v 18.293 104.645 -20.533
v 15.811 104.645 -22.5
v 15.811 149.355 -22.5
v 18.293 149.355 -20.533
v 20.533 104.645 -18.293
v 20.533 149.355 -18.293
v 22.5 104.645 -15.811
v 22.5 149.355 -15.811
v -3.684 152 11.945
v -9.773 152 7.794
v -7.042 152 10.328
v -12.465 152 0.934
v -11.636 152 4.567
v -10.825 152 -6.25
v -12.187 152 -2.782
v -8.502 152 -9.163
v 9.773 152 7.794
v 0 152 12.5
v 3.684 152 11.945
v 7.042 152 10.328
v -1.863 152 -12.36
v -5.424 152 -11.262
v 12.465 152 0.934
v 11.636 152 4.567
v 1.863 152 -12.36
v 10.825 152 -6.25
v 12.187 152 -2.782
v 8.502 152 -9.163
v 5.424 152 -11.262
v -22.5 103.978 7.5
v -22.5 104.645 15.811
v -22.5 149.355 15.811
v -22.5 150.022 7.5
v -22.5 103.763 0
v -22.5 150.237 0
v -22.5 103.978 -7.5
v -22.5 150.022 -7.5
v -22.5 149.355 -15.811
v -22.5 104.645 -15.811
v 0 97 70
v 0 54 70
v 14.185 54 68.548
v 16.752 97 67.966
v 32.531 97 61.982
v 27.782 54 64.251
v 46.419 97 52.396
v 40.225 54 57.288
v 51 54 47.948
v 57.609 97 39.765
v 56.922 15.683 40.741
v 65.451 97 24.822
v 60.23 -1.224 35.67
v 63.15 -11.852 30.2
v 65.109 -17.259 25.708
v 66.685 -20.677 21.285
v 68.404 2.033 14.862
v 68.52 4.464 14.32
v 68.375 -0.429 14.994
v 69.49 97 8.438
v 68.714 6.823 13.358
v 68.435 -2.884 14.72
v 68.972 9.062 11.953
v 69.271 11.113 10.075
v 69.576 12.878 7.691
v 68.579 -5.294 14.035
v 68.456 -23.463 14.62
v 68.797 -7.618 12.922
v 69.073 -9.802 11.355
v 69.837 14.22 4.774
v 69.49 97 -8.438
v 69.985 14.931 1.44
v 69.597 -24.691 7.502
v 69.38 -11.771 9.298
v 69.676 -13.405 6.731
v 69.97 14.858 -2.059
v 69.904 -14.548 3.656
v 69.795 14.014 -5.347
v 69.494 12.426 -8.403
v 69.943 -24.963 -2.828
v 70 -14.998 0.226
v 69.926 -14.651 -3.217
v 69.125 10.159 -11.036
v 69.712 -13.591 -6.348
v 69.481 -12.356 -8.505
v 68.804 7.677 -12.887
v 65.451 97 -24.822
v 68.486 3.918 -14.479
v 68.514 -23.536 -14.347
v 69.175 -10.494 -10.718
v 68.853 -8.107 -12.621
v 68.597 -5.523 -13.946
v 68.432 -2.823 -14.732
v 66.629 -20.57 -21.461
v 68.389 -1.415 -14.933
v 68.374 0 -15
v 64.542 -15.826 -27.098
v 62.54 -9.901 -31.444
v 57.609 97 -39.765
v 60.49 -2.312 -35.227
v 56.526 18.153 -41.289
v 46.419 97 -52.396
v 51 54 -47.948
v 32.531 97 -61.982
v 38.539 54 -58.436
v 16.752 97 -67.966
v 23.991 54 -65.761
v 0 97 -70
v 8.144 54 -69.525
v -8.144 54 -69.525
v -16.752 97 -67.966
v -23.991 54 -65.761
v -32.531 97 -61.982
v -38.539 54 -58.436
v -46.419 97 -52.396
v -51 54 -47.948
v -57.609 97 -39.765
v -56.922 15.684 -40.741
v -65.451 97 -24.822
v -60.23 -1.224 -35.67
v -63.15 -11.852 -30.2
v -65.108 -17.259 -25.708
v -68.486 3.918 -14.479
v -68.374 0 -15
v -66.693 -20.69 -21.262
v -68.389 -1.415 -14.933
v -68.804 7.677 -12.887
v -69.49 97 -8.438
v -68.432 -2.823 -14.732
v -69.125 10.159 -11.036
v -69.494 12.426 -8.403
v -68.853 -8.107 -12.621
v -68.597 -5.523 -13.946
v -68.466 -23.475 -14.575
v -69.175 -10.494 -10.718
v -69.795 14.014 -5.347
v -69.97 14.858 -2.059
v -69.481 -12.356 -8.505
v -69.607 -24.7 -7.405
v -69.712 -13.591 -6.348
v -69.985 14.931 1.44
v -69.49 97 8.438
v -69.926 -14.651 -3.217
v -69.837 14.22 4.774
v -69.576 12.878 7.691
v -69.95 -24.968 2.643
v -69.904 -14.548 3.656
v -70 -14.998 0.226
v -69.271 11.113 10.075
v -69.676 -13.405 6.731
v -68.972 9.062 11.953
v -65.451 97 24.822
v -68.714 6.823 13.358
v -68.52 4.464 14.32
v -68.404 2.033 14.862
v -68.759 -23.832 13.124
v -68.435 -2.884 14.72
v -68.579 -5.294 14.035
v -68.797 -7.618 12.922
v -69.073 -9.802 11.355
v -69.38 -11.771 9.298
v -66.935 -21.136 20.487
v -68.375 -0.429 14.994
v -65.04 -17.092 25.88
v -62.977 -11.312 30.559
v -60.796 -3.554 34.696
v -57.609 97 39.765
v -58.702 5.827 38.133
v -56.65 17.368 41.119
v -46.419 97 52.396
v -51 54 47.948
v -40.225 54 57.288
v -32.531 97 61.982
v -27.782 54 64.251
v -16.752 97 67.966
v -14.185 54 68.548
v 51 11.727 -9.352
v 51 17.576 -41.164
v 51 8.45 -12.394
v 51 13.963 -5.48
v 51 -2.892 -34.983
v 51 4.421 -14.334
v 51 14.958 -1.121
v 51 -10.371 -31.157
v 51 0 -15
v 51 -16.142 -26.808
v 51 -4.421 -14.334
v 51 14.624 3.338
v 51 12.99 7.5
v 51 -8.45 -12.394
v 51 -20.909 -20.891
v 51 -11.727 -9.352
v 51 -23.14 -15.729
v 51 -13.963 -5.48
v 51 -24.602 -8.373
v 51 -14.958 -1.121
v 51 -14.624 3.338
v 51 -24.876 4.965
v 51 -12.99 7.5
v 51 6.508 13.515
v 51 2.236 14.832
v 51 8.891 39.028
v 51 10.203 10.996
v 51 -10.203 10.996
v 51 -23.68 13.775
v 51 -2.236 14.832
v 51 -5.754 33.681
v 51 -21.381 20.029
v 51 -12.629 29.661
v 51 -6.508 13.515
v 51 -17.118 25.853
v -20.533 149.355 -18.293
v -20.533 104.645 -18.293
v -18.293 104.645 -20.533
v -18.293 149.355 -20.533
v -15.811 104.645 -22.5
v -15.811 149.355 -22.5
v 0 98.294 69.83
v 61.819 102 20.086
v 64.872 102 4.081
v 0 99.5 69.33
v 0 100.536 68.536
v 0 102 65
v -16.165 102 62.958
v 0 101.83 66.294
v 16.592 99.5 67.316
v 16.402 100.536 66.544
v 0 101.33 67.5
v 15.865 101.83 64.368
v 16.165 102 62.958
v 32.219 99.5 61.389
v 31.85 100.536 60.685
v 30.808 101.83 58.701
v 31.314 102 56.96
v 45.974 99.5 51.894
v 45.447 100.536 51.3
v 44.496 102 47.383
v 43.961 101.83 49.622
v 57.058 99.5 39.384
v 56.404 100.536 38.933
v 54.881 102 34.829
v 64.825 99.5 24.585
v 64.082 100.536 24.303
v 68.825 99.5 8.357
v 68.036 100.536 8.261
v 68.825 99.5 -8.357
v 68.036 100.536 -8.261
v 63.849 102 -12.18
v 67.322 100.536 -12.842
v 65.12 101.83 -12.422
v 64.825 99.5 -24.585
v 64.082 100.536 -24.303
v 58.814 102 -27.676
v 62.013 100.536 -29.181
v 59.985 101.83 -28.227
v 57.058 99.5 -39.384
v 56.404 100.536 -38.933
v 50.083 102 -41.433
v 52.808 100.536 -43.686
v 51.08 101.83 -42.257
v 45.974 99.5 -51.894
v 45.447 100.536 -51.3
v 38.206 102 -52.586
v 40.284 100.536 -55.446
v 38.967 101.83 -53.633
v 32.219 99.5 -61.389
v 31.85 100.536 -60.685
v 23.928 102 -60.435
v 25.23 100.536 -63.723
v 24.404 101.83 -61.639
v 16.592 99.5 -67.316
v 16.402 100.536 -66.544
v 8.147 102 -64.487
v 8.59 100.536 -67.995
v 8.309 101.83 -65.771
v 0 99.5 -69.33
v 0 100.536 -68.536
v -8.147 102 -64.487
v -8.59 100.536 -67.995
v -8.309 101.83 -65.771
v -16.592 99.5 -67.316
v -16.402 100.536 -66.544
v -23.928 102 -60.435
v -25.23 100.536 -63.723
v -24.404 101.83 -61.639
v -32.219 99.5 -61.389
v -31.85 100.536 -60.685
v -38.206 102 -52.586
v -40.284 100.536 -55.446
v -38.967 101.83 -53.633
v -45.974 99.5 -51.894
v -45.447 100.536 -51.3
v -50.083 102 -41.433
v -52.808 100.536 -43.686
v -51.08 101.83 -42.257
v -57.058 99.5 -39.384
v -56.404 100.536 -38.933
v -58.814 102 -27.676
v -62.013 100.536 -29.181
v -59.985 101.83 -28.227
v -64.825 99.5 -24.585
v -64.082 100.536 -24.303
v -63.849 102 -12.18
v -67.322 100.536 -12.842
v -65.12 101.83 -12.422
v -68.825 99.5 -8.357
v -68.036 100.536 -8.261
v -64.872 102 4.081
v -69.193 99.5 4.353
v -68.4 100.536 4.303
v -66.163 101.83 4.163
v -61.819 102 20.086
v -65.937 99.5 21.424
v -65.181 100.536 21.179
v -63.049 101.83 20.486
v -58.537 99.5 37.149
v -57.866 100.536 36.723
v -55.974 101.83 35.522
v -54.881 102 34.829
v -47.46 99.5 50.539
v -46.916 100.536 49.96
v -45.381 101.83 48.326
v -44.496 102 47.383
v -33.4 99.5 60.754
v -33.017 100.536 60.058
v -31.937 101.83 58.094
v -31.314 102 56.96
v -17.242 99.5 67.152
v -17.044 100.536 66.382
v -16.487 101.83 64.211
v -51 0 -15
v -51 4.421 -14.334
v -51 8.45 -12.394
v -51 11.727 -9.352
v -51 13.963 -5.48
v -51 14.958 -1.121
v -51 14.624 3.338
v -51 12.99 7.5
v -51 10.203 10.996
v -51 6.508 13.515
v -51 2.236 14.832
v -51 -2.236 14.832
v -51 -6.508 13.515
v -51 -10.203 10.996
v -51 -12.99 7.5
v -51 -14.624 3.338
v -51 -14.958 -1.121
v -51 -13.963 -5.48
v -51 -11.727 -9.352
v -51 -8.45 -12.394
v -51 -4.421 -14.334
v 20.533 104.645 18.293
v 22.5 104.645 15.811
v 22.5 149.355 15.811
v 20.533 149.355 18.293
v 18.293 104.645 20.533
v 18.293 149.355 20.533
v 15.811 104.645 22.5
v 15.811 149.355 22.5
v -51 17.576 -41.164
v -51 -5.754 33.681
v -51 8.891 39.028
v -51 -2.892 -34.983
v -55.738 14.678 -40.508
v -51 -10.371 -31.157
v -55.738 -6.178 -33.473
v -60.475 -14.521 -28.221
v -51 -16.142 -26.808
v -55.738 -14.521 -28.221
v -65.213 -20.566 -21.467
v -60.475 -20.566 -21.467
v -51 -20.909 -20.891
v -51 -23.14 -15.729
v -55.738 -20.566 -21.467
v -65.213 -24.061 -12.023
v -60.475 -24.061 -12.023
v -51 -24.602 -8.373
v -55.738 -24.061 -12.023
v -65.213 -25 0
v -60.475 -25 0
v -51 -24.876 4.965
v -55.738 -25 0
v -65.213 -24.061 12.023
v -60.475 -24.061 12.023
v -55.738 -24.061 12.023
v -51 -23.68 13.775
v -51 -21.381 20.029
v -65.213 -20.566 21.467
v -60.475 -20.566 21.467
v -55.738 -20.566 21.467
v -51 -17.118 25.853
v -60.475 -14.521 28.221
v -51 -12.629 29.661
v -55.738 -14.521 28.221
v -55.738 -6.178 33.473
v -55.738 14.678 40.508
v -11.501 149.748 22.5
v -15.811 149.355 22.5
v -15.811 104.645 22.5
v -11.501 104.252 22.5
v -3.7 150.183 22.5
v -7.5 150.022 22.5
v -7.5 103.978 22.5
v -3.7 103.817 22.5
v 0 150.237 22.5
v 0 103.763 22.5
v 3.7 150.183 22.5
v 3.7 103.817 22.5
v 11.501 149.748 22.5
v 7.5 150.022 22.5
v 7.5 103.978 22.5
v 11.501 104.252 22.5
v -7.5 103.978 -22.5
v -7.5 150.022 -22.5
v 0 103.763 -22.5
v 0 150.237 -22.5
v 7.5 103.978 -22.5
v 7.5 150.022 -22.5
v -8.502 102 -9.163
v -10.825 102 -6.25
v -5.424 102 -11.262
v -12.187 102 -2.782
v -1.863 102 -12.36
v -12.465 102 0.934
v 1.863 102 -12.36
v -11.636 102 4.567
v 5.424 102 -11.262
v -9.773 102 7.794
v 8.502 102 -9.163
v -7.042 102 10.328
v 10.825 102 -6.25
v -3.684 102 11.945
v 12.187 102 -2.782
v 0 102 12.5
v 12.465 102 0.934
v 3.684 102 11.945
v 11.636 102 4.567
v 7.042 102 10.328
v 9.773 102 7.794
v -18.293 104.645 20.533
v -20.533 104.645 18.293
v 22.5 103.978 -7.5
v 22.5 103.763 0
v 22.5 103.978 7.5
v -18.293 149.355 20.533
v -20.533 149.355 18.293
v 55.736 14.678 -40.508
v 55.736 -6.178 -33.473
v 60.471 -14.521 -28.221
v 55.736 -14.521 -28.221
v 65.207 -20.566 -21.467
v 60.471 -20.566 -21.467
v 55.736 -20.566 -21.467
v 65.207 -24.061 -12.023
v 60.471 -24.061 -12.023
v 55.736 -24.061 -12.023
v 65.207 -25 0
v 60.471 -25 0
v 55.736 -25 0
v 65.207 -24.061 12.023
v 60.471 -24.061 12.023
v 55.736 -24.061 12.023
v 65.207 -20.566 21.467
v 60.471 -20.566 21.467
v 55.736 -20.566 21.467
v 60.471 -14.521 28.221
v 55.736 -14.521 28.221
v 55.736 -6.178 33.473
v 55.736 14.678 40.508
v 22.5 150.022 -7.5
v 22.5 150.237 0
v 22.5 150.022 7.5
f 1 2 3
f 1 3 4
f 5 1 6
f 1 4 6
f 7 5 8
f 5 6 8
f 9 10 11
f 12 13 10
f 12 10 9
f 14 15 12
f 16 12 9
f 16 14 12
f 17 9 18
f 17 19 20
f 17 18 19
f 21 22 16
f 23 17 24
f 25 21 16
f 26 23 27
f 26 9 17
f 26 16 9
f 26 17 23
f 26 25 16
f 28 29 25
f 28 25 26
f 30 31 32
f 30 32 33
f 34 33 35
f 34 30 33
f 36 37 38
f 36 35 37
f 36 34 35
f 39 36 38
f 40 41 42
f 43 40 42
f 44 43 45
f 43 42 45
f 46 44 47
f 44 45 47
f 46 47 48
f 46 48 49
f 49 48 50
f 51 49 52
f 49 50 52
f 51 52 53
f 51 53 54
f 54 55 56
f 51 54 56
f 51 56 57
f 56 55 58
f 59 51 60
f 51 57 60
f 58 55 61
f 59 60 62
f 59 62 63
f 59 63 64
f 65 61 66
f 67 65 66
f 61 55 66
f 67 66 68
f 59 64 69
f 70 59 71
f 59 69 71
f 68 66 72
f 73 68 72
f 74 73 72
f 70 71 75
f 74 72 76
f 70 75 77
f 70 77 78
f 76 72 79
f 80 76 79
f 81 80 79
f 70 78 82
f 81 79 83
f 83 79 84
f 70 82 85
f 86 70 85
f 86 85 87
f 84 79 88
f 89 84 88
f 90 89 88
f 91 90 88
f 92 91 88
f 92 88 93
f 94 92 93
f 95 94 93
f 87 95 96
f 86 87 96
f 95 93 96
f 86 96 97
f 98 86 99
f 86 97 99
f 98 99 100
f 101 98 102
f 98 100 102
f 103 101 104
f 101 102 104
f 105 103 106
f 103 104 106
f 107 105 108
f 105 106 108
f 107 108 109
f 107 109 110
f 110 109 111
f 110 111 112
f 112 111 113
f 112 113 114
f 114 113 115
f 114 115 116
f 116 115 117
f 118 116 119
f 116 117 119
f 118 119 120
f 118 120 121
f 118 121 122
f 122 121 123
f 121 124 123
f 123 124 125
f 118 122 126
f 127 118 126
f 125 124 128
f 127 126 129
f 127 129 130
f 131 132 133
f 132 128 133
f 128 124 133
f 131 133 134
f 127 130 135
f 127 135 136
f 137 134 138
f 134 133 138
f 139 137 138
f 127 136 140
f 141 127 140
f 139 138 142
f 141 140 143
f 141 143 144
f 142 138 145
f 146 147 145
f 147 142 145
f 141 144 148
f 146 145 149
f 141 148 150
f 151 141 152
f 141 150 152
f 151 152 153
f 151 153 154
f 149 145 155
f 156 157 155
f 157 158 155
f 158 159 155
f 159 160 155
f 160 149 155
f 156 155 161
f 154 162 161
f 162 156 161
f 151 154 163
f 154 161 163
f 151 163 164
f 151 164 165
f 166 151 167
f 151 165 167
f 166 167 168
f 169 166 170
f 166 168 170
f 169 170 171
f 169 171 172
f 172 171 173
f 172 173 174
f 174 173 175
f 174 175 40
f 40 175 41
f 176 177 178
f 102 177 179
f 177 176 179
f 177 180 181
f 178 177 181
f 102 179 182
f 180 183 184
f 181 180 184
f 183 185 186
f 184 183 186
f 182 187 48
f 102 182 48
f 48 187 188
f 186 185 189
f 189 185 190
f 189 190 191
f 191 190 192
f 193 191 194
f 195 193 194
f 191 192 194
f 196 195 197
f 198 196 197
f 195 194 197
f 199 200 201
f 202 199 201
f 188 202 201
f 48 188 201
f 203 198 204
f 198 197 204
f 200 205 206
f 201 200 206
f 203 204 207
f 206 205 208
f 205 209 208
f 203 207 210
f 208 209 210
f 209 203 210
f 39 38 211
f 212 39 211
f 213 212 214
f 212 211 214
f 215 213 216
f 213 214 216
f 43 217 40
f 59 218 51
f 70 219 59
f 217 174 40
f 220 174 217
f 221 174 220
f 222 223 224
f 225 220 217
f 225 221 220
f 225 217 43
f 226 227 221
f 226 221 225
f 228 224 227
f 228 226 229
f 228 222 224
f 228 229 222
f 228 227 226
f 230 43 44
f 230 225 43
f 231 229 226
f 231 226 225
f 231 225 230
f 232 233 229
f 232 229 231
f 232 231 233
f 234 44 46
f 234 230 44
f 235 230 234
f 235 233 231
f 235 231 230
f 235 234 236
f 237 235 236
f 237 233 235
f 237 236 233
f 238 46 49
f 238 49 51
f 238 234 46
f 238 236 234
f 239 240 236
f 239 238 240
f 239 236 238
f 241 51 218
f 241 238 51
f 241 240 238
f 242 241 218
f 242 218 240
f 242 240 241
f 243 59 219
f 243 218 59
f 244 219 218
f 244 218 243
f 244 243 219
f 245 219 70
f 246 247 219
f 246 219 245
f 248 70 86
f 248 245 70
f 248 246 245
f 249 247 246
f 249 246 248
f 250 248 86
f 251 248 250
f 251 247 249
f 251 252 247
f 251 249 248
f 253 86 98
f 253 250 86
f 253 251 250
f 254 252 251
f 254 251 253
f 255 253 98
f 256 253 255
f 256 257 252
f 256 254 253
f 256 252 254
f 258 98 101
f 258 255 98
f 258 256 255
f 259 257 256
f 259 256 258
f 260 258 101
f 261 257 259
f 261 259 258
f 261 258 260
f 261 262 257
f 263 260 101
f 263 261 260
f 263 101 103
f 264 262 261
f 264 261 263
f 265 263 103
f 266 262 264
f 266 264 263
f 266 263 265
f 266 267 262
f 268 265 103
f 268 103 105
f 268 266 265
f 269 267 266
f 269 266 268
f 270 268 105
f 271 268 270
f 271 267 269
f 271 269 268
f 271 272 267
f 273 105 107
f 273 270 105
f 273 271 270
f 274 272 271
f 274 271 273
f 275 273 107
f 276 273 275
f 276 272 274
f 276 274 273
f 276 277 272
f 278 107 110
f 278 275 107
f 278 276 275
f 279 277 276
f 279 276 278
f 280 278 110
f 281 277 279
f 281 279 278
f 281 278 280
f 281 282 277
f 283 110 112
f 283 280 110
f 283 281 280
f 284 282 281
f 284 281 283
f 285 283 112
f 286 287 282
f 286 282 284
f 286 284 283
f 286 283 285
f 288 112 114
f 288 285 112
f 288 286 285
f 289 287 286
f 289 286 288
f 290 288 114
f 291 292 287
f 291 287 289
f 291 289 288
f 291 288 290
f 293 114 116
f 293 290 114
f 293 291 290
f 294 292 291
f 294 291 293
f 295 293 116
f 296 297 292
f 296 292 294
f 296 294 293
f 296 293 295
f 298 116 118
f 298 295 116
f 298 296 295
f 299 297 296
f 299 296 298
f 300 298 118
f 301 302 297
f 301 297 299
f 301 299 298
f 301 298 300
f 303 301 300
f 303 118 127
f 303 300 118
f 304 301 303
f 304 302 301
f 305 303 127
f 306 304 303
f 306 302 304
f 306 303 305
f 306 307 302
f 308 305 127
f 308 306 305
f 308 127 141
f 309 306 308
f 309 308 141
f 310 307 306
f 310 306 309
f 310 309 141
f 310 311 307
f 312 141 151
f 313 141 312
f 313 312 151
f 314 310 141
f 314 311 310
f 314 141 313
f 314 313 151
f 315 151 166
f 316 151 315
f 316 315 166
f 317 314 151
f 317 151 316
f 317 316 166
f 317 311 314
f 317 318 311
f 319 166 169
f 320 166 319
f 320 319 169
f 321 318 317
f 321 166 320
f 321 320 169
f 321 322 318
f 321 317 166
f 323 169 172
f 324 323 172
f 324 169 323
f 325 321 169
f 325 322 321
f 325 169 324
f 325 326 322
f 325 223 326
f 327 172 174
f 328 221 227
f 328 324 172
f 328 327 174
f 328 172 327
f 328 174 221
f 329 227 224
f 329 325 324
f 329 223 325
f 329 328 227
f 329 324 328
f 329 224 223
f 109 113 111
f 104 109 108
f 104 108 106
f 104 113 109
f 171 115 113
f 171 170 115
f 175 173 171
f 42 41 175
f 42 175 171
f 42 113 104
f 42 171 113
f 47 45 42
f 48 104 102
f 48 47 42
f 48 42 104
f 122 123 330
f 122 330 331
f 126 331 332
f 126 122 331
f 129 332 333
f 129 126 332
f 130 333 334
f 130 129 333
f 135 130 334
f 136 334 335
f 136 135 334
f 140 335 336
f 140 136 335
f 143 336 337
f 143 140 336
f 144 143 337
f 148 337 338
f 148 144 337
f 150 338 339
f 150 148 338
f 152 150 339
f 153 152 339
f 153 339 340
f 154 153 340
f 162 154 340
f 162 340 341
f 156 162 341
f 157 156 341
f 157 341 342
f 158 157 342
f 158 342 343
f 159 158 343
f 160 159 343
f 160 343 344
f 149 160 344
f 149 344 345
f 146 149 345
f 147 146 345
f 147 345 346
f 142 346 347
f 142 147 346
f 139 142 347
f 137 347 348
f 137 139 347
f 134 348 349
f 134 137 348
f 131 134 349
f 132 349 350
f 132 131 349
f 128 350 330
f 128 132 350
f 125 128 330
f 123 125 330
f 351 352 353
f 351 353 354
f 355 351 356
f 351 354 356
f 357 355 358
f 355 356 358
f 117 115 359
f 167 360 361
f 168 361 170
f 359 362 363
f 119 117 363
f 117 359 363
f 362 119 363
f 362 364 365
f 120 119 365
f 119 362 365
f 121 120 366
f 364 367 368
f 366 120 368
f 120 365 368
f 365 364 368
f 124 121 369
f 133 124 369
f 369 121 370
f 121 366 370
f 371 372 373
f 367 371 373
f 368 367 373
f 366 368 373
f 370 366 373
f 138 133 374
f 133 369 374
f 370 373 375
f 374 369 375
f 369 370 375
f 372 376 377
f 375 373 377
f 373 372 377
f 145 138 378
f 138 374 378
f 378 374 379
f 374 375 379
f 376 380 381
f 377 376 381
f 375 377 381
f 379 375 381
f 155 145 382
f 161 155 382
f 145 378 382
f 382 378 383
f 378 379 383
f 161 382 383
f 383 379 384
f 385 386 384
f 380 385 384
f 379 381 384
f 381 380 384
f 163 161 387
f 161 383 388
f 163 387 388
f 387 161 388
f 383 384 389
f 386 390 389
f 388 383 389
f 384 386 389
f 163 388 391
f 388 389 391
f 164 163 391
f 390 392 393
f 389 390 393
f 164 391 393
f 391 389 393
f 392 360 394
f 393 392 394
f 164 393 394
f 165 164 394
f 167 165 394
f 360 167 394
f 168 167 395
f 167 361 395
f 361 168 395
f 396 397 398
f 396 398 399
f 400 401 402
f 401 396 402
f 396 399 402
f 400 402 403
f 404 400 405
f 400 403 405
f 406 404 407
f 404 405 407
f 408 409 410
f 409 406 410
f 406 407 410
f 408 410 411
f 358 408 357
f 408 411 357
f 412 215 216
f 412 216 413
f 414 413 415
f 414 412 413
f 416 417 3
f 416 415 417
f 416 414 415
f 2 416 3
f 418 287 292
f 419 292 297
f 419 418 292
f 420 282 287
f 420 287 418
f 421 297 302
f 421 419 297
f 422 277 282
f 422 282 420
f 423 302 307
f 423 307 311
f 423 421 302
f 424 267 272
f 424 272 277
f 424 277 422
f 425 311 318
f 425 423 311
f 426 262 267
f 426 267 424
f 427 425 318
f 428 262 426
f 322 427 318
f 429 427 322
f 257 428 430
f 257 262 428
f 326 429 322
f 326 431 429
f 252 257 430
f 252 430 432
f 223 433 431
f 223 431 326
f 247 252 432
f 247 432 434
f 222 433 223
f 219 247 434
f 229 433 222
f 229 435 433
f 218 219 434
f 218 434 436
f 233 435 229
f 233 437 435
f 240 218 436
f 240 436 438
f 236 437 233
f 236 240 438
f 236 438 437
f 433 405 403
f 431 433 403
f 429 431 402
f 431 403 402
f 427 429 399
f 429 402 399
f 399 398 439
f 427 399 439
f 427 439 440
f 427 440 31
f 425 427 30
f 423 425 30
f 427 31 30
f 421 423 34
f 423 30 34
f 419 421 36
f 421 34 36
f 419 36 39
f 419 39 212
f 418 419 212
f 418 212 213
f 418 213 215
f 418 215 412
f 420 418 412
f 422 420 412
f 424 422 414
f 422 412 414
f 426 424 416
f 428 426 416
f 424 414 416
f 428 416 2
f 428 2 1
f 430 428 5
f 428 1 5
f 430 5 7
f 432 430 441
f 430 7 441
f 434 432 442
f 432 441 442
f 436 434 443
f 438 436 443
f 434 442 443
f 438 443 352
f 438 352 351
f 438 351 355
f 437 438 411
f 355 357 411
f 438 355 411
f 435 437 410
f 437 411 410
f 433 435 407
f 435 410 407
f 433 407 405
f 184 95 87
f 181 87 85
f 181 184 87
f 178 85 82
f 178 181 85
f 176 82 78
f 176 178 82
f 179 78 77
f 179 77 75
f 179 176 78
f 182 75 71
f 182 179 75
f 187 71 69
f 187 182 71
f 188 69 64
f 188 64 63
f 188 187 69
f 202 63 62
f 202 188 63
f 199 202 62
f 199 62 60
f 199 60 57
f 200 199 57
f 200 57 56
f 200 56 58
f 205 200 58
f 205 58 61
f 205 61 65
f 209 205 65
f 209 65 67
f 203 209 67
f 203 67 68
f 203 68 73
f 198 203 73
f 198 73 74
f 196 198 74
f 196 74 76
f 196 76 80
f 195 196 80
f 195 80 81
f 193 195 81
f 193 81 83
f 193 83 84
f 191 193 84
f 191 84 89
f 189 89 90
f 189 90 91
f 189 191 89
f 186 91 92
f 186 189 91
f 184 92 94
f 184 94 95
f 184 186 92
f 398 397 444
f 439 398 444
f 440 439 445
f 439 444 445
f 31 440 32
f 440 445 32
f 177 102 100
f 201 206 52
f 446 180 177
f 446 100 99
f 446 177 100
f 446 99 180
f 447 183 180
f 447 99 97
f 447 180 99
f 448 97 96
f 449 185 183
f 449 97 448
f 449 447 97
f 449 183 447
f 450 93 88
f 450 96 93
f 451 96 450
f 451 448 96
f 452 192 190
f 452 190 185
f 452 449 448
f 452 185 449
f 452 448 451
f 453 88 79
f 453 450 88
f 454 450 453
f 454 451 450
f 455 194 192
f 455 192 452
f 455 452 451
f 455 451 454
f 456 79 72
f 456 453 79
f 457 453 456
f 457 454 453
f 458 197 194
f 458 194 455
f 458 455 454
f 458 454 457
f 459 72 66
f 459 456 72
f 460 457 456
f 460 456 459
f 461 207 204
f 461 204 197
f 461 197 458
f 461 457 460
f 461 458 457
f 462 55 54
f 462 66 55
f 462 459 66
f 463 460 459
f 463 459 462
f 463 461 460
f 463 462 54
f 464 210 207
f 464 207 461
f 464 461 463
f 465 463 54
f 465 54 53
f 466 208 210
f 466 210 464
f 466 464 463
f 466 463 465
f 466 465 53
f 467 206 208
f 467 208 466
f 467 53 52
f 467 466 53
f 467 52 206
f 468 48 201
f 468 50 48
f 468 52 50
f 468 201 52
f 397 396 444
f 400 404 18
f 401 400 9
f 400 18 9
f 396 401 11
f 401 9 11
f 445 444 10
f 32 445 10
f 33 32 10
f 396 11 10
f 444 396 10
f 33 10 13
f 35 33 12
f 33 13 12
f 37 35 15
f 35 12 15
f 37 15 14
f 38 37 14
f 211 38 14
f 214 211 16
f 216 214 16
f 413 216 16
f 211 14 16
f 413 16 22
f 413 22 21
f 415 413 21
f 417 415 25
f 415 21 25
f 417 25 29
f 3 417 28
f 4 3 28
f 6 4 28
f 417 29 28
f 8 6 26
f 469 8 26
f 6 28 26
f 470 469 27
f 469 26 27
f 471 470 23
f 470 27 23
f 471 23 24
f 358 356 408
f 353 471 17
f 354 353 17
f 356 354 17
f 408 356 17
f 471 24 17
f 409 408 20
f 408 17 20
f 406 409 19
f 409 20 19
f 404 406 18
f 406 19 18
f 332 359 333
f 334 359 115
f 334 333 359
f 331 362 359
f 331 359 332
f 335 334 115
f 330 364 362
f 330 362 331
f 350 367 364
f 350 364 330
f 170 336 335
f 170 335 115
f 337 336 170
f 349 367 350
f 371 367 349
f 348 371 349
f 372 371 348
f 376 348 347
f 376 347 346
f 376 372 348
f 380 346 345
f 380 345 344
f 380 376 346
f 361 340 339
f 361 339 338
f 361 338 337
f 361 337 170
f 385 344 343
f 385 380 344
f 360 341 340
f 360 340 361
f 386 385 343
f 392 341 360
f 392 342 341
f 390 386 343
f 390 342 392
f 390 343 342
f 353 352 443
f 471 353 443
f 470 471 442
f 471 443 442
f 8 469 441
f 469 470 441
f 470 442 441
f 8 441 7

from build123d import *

# Parameters (mm, degrees)
BOSS_EXTRUDE1_DEPTH      = 102
BOSS_EXTRUDE1_DEPTH_BACK = 30
SKETCH1_R                = 70
SKETCH2_W                = 45
SKETCH2_H                = 45
BOSS_EXTRUDE2_DEPTH      = 50
FILLET1_R                = 5
FILLET2_R                = 5
SKETCH4_W                = 102
SKETCH4_H                = 150
CUT_EXTRUDE1_DEPTH       = 84
CUT_EXTRUDE3_DEPTH       = 72
CUT_EXTRUDE4_DEPTH       = 182.394597571
CUT_EXTRUDE4_DEPTH_BACK  = 182.394597571
SKETCH6_R                = 15


with BuildPart() as part:
    # Sketch1 → Boss-Extrude1 (new, two sides: drawn at the far end of the back side and taken through both)
    with BuildSketch(Plane(origin=(0, 0, 0), x_dir=(1, 0, 0), z_dir=(0, 1, 0)).offset(-BOSS_EXTRUDE1_DEPTH_BACK)):
        with Locations(Location((0, 0, 0), (0, 0, 270))):
            Circle(SKETCH1_R)
    extrude(amount=BOSS_EXTRUDE1_DEPTH + BOSS_EXTRUDE1_DEPTH_BACK)

    # Sketch2 → Boss-Extrude2 (add)
    with BuildSketch(Plane(origin=(0, 102, 0), x_dir=(1, 0, 0), z_dir=(0, 1, 0))):
        Rectangle(SKETCH2_W, SKETCH2_H)
    extrude(amount=BOSS_EXTRUDE2_DEPTH)

    # Fillet1
    fillet1_edges = [part.edges().sort_by_distance(p)[0] for p in [
        (0, 102, -70),
    ]]
    fillet(fillet1_edges, radius=FILLET1_R)

    # Fillet2
    fillet2_edges = [part.edges().sort_by_distance(p)[0] for p in [
        (0, -30, -70),
    ]]
    fillet(fillet2_edges, radius=FILLET2_R)

    # Sketch3 → Cut-Revolve2 (revolve, cut)
    with BuildSketch(Plane.XY, mode=Mode.PRIVATE) as cut_revolve2_sk:
        Polygon((-12.5, 152), (-47.512769581, 152), (-47.512769581, 102), (-12.5, 102), (-27.5, 104.644904711), (-27.5, 149.355095289), align=None)
    revolve(cut_revolve2_sk.sketch.rotate(Axis((0, 160.85, 0), (0, -1, 0)), 270), axis=Axis((0, 160.85, 0), (0, -1, 0)), mode=Mode.SUBTRACT)

    # Sketch4 → Cut-Extrude1 (cut)
    with BuildSketch(Plane.XZ.offset(30)):
        Rectangle(SKETCH4_W, SKETCH4_H)
    extrude(amount=-CUT_EXTRUDE1_DEPTH, mode=Mode.SUBTRACT)

    # Sketch5 → Cut-Extrude3 (cut, symmetric)
    with BuildSketch(Plane(origin=(0, 0, 0), x_dir=(0, 0, -1), z_dir=(1, 0, 0))):
        with BuildLine():
            Line((-47.947888379, 54), (-70, 54))
            Line((-70, 54), (-70, -34.210439424))
            Line((-70, -34.210439424), (78.024892387, -34.210439424))
            Line((78.024892387, -34.210439424), (78.024892387, 54))
            Line((78.024892387, 54), (47.947888379, 54))
            add(Edge.make_bspline(
                [(47.947888379, 54), (43.174062714, 36.113920215), (41.307491939, -20.223592095), (8.979551546, -25), (0, -25)],
                knots=[0, 0, 0, 0, 0.785107117, 1, 1, 1, 1], degree=3))
            add(Edge.make_bspline(
                [(-47.947888379, 54), (-43.174062714, 36.113920215), (-41.307491939, -20.223592095), (-8.979551546, -25), (0, -25)],
                knots=[0, 0, 0, 0, 0.785107117, 1, 1, 1, 1], degree=3))
        make_face()
    extrude(amount=CUT_EXTRUDE3_DEPTH, both=True, mode=Mode.SUBTRACT)

    # Sketch6 → Cut-Extrude4 (cut, two sides: drawn at the far end of the back side and taken through both)
    with BuildSketch(Plane(origin=(0, 0, 0), x_dir=(0, 0, -1), z_dir=(1, 0, 0)).offset(-CUT_EXTRUDE4_DEPTH_BACK)):
        Circle(SKETCH6_R)
    extrude(amount=CUT_EXTRUDE4_DEPTH + CUT_EXTRUDE4_DEPTH_BACK, mode=Mode.SUBTRACT)


solid = part.part
